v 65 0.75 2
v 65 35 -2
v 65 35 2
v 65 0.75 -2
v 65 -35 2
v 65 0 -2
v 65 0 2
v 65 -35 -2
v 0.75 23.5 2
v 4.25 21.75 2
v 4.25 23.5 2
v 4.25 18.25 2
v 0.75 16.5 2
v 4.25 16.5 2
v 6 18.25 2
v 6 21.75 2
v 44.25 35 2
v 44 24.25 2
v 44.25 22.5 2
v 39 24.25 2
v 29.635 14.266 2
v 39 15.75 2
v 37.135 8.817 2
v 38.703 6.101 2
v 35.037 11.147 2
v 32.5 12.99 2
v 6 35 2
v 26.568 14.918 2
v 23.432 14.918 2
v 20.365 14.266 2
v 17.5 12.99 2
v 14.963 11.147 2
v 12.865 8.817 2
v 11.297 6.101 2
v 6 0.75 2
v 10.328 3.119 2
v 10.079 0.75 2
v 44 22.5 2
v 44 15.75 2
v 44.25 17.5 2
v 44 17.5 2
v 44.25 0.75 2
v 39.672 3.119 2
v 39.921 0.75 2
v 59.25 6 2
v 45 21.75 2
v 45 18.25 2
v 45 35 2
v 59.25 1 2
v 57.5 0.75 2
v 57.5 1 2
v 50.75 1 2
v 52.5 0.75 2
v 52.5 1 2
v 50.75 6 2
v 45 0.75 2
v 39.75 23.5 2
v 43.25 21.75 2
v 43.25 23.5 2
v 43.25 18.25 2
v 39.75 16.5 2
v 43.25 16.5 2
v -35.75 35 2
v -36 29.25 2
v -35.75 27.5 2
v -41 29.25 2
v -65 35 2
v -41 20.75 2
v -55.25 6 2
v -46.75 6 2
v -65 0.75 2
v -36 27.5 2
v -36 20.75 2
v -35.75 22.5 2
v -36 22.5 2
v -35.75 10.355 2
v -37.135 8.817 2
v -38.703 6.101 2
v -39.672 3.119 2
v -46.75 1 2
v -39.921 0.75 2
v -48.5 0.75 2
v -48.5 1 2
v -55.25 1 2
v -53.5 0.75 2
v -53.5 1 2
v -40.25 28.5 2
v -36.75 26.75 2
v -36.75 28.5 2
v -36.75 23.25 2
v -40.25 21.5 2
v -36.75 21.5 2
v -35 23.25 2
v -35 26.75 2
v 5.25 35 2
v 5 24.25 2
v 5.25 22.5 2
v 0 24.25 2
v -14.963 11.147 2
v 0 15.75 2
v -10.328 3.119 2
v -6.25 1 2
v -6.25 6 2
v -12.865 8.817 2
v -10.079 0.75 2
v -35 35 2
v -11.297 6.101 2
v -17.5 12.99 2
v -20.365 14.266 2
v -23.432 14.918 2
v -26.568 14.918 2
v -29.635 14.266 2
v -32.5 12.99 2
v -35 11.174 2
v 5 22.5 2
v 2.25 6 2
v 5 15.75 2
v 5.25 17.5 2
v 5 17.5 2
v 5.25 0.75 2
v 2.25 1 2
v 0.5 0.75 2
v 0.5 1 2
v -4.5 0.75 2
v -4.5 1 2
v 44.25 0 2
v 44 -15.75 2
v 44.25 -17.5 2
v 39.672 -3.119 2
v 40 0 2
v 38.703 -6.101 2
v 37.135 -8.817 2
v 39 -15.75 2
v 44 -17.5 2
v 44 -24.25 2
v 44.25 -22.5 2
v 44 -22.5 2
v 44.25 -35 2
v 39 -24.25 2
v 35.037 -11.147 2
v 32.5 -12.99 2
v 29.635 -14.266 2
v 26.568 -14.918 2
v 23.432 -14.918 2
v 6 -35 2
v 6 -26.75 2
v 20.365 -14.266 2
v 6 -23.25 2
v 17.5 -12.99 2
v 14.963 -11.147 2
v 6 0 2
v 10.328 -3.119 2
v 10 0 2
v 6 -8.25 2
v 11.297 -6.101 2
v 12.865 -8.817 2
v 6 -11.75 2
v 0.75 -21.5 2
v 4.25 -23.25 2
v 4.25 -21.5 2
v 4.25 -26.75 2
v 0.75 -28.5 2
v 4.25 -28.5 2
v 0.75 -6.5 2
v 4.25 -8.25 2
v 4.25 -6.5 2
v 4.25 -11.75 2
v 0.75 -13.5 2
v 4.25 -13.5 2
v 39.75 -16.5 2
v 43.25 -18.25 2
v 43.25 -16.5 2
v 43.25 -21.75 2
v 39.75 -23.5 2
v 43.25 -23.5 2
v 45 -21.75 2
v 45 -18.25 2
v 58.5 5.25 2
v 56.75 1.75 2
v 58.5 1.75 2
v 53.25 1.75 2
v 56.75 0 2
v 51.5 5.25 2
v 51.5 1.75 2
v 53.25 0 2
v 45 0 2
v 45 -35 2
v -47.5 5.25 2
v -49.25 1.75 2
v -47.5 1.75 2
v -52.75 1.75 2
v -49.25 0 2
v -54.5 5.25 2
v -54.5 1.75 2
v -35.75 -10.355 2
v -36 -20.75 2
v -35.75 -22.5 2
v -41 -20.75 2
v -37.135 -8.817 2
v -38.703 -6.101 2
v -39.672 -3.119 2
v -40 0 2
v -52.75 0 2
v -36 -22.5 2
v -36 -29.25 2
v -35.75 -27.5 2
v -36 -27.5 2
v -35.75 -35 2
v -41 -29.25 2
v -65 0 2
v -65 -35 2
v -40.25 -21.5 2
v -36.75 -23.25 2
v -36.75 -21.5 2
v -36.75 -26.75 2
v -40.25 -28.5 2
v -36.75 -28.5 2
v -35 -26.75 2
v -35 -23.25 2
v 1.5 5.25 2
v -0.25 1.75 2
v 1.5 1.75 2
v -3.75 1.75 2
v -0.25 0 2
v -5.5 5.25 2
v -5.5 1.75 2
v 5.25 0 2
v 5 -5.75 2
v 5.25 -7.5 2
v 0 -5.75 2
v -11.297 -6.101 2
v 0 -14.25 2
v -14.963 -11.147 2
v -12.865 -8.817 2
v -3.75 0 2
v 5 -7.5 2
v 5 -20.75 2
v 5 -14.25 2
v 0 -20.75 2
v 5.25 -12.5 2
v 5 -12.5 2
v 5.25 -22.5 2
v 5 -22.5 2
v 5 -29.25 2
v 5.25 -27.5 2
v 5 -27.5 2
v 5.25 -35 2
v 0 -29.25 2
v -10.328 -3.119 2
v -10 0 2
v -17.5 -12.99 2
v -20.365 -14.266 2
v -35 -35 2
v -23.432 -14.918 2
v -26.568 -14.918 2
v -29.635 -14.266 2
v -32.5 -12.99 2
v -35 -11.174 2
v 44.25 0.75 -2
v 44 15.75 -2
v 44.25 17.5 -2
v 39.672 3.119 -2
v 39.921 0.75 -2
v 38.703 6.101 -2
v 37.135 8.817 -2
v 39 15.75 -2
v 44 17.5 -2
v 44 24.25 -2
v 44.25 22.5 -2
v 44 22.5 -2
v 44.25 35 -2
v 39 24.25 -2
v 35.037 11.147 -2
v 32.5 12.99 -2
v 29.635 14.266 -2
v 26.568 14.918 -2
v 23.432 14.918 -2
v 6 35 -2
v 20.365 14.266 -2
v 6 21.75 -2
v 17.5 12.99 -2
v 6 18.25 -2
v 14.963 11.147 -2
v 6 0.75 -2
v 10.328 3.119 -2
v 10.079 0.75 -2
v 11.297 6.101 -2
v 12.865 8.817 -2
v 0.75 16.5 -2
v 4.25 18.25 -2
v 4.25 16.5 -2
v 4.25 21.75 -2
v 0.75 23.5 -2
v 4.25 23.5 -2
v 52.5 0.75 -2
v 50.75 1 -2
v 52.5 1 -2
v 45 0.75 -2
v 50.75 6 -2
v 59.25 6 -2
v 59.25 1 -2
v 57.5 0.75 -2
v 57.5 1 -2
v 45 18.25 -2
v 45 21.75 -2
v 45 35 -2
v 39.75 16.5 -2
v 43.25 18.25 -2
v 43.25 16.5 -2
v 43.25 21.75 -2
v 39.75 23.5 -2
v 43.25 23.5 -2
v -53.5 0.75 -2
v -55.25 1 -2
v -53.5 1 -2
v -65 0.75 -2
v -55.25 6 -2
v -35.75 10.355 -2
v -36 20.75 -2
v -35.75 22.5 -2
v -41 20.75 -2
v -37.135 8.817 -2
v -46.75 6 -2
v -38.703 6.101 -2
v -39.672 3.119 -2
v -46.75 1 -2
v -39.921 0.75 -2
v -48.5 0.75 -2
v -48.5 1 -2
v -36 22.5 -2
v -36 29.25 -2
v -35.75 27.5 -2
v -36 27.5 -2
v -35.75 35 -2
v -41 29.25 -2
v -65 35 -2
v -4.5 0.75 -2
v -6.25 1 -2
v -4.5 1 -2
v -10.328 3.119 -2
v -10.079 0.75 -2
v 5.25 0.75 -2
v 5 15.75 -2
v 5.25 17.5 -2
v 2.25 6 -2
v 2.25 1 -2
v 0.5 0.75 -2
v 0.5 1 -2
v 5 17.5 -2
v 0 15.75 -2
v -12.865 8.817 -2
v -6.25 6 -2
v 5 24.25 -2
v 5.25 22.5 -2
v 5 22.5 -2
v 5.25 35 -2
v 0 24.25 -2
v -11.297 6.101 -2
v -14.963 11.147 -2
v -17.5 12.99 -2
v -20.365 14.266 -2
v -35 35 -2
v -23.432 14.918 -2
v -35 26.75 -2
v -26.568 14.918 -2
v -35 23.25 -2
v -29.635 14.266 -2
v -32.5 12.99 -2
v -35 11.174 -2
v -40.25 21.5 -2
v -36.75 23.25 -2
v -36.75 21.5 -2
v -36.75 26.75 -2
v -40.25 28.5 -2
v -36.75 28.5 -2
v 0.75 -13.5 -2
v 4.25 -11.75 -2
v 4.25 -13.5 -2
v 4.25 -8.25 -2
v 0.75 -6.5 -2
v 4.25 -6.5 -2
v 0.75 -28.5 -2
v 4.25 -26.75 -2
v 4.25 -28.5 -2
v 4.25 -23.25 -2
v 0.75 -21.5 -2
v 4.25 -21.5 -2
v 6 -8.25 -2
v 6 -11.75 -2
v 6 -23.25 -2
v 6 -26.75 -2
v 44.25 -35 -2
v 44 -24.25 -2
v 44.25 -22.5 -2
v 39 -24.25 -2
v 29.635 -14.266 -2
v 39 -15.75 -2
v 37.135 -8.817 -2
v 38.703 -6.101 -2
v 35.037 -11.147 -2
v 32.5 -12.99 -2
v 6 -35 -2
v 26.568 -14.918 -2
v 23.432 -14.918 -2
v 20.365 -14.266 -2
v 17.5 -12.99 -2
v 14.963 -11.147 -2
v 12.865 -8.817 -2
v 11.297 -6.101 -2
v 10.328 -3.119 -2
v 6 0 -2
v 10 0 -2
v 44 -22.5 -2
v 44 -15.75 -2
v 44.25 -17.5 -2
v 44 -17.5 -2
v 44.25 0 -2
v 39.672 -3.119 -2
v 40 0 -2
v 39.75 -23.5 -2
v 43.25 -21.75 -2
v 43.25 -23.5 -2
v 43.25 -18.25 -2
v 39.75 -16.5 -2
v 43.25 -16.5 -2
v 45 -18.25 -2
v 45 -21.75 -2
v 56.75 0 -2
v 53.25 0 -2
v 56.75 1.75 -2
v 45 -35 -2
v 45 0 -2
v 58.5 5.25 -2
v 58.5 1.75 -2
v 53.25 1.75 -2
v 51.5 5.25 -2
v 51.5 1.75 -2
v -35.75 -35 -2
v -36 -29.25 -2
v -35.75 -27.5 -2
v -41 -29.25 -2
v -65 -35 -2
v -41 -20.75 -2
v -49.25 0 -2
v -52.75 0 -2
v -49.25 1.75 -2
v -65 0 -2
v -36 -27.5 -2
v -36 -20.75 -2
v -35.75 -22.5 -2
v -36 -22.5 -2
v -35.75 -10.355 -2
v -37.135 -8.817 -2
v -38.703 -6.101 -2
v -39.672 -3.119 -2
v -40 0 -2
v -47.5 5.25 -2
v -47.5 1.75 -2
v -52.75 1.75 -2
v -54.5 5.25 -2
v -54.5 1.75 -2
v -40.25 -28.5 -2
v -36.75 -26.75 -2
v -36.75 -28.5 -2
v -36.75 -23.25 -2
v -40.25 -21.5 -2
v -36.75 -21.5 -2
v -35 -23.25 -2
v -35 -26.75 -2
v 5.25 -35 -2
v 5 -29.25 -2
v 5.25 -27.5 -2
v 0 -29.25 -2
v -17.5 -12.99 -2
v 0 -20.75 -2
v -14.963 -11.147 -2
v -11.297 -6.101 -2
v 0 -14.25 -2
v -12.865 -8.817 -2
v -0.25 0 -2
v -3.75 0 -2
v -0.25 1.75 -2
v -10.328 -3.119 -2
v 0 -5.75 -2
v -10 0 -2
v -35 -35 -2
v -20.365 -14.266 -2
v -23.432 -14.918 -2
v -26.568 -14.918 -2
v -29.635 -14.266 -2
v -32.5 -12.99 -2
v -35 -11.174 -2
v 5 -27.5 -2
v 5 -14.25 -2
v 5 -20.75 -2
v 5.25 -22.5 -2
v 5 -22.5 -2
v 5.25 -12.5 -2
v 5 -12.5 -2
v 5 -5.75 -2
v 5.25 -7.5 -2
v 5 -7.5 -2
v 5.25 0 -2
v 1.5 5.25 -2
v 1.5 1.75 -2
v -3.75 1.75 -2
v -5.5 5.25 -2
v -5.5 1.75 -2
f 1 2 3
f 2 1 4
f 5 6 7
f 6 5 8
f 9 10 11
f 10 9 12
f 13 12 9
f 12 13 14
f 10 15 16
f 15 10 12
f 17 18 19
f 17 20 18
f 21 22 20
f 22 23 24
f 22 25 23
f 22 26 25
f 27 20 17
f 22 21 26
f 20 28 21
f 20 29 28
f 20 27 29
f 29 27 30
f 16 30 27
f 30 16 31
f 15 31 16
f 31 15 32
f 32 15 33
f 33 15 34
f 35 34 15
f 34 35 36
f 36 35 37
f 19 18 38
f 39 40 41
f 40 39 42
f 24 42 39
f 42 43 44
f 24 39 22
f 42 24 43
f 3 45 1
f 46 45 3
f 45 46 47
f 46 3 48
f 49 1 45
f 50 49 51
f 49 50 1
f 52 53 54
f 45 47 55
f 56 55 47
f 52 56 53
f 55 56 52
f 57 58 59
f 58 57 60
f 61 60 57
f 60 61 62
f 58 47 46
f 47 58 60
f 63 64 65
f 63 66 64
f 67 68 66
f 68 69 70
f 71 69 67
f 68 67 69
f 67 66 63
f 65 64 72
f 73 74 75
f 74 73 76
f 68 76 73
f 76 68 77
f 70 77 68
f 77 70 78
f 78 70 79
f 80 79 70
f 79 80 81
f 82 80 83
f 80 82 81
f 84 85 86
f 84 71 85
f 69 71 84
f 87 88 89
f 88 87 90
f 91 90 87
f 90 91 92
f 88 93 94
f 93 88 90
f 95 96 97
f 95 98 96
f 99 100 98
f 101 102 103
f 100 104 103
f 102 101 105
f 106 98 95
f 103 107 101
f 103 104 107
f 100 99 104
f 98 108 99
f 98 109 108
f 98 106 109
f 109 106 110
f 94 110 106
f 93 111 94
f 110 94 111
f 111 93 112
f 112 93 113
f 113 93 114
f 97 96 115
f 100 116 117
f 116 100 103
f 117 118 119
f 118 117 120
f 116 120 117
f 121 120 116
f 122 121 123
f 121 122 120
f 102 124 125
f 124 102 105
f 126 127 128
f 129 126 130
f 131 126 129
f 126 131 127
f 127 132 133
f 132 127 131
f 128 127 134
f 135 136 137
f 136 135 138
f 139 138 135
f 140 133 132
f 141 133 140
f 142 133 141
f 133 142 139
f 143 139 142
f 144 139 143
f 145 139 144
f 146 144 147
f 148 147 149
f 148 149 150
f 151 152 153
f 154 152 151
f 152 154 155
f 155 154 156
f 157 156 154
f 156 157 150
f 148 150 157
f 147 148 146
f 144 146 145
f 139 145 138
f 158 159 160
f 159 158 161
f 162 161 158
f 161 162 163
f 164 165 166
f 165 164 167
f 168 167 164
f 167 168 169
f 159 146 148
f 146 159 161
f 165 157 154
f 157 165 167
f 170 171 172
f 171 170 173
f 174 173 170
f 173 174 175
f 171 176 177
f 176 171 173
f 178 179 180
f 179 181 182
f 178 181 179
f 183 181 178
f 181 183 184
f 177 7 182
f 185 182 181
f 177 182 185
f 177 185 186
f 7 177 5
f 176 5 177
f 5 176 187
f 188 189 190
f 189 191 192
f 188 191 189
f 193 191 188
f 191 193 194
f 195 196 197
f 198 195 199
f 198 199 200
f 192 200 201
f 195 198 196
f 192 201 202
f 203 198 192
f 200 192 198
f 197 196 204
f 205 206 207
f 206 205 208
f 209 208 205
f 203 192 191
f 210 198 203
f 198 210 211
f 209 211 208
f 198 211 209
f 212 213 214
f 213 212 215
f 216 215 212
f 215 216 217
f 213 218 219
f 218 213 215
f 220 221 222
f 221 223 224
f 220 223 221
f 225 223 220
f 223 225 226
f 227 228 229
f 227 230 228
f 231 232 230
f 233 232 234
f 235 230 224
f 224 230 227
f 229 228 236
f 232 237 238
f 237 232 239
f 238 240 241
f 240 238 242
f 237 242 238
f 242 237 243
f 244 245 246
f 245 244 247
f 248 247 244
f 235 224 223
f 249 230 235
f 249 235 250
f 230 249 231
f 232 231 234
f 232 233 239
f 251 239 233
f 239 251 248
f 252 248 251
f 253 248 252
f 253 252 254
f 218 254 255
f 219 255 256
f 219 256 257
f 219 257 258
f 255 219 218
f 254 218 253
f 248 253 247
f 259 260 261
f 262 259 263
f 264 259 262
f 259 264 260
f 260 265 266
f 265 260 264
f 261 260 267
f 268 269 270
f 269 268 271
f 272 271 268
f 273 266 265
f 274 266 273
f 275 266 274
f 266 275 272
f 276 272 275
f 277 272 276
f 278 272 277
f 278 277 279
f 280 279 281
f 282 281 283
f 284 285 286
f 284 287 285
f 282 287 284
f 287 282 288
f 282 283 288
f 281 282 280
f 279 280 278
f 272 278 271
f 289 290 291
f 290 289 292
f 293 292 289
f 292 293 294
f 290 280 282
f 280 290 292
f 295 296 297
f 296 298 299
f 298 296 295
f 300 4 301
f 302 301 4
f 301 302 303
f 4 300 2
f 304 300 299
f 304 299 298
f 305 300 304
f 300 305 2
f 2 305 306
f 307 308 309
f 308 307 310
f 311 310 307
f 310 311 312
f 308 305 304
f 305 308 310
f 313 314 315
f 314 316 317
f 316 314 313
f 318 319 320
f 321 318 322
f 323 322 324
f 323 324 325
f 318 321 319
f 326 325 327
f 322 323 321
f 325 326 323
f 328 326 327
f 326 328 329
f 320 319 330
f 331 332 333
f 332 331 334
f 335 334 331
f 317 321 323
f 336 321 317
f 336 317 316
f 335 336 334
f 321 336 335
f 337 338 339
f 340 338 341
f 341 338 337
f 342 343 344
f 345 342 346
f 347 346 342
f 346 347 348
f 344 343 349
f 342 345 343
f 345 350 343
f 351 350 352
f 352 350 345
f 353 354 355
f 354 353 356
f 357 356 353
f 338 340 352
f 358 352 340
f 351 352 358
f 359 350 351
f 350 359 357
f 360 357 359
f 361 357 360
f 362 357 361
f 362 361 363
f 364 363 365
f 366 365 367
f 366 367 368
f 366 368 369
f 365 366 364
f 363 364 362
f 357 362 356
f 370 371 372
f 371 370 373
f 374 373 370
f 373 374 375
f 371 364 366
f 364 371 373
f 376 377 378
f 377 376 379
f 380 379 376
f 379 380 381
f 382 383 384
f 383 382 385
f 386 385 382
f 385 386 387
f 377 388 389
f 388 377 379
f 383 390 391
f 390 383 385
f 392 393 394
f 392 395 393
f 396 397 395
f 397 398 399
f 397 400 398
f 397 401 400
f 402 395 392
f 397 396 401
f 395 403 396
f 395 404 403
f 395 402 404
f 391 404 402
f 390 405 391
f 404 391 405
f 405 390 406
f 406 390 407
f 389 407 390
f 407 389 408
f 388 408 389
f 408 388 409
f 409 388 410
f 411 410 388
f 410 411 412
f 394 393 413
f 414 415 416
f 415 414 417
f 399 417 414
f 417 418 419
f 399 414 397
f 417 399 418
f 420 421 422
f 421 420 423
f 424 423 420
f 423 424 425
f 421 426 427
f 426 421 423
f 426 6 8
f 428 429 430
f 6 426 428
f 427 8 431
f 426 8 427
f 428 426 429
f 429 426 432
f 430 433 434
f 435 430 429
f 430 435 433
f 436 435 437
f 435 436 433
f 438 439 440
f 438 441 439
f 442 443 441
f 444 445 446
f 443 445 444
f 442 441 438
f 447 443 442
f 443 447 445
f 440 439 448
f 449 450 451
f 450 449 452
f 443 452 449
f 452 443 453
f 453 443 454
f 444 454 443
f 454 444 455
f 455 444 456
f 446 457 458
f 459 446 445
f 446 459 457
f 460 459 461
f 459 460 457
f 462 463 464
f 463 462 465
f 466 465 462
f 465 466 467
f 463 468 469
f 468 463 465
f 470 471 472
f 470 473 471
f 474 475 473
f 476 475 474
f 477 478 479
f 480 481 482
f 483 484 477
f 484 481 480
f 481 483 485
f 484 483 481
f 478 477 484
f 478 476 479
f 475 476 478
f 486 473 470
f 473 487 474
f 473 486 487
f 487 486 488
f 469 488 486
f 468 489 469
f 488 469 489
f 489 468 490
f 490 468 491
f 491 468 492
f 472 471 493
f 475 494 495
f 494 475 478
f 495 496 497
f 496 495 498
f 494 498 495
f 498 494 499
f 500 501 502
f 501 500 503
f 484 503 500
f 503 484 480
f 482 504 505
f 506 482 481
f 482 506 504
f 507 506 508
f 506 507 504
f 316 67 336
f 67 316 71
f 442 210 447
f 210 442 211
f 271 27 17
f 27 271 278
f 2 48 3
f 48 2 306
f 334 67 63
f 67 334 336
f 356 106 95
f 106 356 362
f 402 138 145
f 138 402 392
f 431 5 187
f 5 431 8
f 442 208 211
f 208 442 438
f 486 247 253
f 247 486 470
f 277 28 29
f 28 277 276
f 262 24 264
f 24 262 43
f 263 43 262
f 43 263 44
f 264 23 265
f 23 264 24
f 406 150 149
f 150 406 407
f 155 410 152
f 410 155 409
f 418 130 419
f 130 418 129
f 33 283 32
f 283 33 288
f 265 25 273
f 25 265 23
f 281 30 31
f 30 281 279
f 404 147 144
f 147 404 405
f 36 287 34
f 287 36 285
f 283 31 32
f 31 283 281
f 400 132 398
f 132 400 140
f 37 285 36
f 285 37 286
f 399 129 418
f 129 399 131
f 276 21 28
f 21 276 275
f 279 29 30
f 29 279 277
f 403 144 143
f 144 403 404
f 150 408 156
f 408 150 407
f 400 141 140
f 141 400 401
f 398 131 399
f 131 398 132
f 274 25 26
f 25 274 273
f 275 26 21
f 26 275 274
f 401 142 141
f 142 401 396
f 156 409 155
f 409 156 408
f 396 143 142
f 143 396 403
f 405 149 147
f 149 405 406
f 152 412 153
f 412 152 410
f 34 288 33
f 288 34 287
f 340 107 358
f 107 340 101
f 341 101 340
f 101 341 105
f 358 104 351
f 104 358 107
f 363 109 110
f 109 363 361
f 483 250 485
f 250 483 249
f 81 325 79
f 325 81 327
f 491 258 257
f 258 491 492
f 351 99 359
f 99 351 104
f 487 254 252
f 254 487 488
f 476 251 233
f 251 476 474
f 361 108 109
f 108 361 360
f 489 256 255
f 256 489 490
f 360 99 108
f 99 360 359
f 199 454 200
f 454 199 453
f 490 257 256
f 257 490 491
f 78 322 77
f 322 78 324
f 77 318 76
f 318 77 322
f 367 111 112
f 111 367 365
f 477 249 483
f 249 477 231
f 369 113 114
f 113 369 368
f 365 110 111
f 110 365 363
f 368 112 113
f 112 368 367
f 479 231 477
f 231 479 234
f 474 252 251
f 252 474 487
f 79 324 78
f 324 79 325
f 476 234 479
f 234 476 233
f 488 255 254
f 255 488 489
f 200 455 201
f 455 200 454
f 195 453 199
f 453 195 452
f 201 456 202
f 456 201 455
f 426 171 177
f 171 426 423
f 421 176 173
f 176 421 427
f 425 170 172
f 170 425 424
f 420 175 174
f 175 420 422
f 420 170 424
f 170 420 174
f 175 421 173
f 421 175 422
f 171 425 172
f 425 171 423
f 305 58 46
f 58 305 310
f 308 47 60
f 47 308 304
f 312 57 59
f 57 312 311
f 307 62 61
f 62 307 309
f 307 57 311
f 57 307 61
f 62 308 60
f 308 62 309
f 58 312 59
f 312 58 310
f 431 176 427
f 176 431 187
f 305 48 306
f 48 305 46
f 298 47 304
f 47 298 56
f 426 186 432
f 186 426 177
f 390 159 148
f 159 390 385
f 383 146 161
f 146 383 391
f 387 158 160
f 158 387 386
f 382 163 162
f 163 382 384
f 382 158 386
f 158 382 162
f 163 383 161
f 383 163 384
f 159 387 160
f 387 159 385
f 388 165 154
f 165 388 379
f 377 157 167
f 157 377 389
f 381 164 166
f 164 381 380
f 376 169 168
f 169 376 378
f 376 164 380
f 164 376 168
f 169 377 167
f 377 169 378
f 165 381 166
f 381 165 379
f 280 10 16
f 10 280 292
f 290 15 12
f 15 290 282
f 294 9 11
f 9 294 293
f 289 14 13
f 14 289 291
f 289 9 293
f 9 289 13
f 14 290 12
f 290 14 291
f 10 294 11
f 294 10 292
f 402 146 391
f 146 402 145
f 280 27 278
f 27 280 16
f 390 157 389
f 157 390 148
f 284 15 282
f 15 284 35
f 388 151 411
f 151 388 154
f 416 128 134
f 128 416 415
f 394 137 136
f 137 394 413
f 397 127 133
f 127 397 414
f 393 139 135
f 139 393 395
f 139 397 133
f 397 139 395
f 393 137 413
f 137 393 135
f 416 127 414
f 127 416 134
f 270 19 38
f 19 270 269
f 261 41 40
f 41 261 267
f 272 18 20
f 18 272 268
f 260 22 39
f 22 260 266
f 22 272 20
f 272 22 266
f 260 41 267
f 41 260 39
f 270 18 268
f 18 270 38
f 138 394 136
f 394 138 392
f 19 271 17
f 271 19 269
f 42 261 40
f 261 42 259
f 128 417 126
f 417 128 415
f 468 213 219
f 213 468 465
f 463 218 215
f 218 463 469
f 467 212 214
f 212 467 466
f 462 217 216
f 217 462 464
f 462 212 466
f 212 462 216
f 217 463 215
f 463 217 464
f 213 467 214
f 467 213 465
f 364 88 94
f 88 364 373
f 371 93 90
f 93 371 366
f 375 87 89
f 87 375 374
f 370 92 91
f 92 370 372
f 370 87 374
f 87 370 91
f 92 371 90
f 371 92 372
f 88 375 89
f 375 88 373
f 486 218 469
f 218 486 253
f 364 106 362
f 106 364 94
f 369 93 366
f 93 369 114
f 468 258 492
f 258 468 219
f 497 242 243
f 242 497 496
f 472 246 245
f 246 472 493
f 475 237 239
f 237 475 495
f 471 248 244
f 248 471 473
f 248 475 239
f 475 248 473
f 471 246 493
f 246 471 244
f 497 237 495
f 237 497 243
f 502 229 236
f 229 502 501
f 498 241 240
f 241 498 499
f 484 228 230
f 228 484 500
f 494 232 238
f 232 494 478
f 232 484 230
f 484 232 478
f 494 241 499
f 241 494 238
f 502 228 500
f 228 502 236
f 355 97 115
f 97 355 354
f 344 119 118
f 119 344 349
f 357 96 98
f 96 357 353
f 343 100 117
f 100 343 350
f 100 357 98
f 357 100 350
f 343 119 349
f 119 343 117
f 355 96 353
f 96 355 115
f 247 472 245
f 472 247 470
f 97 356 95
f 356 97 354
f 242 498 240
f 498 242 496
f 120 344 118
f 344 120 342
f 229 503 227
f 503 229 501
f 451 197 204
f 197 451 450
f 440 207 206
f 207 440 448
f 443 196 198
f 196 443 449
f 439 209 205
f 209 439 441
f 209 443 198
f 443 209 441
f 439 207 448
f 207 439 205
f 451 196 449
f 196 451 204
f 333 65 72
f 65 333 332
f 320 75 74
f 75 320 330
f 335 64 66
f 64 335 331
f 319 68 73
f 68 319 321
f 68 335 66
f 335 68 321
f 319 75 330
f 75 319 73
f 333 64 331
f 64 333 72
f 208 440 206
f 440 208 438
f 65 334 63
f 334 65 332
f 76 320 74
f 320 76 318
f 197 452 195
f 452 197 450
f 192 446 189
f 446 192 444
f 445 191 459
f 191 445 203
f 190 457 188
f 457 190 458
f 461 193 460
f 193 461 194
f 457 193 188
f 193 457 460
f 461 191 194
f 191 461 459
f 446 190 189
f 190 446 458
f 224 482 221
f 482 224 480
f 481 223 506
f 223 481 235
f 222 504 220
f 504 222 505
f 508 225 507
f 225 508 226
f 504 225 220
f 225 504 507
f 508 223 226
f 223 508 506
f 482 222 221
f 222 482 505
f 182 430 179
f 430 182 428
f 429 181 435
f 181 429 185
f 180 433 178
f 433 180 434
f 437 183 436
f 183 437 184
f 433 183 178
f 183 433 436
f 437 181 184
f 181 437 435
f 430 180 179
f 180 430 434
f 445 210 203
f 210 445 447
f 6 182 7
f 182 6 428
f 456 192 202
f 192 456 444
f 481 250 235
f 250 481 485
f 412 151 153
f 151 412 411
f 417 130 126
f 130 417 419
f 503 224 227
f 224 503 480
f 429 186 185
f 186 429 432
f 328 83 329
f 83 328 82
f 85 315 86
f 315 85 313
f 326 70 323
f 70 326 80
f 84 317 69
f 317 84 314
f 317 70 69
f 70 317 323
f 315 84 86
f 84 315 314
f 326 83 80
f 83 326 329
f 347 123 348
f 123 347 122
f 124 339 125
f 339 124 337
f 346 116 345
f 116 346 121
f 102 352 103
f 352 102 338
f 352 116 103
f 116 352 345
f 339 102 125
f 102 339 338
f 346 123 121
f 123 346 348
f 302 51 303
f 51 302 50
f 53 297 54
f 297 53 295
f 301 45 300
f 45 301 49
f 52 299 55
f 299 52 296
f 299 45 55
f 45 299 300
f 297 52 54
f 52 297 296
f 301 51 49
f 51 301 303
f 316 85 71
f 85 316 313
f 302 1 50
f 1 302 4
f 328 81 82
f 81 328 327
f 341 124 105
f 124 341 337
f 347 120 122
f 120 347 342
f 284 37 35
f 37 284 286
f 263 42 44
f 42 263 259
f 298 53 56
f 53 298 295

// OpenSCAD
// file: demoobject2.scad
//this file is used by multicutdemo.scad (does not render directly)

module drawDemoObject()
{
	difference()
	{
		cube([130,70,4], center=true);
		translate ([25,0,0]) cylinder(h=5, r=15, center=true);
		translate ([-25,0,0]) cylinder(h=5, r=15, center=true);
	}
}
// file: puzzlecutlib.scad
//OpenSCAD PuzzleCut Library - by Rich Olson
//http://www.nothinglabs.com
//Tested on build 2015.03-2
//License: http://creativecommons.org/licenses/by/3.0/

//This is just the library - see other files for demo / usage

//!!!!!
//IMPORTANT NOTE: Puzzlecut only works correctly when RENDERING (F6)!  Preview (F5) will not produce usable results!
//!!!!!


module xMaleCut(offset = 0, cut = xCut1)
{
	difference()
	{
		children(0);	
		translate([0,offset,0]) makePuzzleStamp(cutLocations = cut);
	}
}


module xFemaleCut(offset = 0, cut = xCut1)
{
	intersection()
	{
		children(0);
		translate([0,offset,0]) makePuzzleStamp(cutLocations = cut,
			 kerf = kerf);	//only set kerf on female side
	}
}


module yMaleCut(offset = 0, cut = yCut1)
{
	difference()
	{
		children(0);	
		rotate ([0,0,90]) translate([0,offset,0]) makePuzzleStamp(cutLocations = cut);
	}
}


module yFemaleCut(offset = 0, cut = yCut1)
{
	intersection()
	{
		children(0);
		rotate ([0,0,90]) translate([0,offset,0]) makePuzzleStamp(cutLocations = cut,
			 kerf = kerf);	//only set kerf on female side
	}
}



module makePuzzleStamp(kerf = 0)
{
	difference()
	{
		//make the cube
		translate ([0,stampSize[0] / 2 - kerf,0])
			cube (stampSize, center = true);
		
		//make the cuts
		for ( i = cutLocations )
		{
			translate([i,0,0])
				cube ([(cutSize / 2) - kerf * 2, cutSize - kerf * 2,stampSize[2]], center = true);
			translate([i,cutSize / 2,0])
				cube ([cutSize - kerf *  2,(cutSize / 2) - kerf * 2, stampSize[2]], center = true);
		}		
	}
}
// main file
//OpenSCAD PuzzleCut Library Demo - by Rich Olson
//http://www.nothinglabs.com
//Tested on build 2015.03-2
//License: http://creativecommons.org/licenses/by/3.0/

//!!!!!
//IMPORTANT NOTE: Puzzlecut only works correctly when RENDERING (F6)!  Preview (F5) will not produce usable results!
//!!!!!

include <puzzlecutlib.scad>
include <demoobject2.scad>

stampSize = [500,500,100];		//size of cutting stamp (should cover 1/2 of object)

cutSize = 7;	//size of the puzzle cuts

xCut1 = [-51, -2, 55];			//locations of puzzle cuts relative to Y axis center
yCut1 = [-20, 20];				//locations of puzzle cuts relative to Y axis center
yCut2 = [-25, -10, 20];			//additional Y cut
yCut3 = [-25, 25];				//additional Y cut

kerf = -0.75;	//supports +/- numbers (greater value = tighter fit)
					//using a small negative number may be useful to assure easy fit for 3d printing
					//using positive values useful for lasercutting
					//negative values can also help visualize cuts without seperating pieces

xMaleCut(offset = 0, cut = xCut1) 
	yCuts();

xFemaleCut(offset = 0, cut = xCut1) 
	yCuts();

module yCuts()
{
		yMaleCut(offset = -45, cut = yCut1)
			drawDemoObject();

		yFemaleCut(offset = -45, cut = yCut1)
			yMaleCut(offset = -6, cut = yCut2)
				drawDemoObject();

		yFemaleCut(offset = -6, cut = yCut2)
			yMaleCut(offset = 35, cut = yCut3)
				drawDemoObject();

		yFemaleCut(offset = 35, cut = yCut3)
				drawDemoObject();

}
